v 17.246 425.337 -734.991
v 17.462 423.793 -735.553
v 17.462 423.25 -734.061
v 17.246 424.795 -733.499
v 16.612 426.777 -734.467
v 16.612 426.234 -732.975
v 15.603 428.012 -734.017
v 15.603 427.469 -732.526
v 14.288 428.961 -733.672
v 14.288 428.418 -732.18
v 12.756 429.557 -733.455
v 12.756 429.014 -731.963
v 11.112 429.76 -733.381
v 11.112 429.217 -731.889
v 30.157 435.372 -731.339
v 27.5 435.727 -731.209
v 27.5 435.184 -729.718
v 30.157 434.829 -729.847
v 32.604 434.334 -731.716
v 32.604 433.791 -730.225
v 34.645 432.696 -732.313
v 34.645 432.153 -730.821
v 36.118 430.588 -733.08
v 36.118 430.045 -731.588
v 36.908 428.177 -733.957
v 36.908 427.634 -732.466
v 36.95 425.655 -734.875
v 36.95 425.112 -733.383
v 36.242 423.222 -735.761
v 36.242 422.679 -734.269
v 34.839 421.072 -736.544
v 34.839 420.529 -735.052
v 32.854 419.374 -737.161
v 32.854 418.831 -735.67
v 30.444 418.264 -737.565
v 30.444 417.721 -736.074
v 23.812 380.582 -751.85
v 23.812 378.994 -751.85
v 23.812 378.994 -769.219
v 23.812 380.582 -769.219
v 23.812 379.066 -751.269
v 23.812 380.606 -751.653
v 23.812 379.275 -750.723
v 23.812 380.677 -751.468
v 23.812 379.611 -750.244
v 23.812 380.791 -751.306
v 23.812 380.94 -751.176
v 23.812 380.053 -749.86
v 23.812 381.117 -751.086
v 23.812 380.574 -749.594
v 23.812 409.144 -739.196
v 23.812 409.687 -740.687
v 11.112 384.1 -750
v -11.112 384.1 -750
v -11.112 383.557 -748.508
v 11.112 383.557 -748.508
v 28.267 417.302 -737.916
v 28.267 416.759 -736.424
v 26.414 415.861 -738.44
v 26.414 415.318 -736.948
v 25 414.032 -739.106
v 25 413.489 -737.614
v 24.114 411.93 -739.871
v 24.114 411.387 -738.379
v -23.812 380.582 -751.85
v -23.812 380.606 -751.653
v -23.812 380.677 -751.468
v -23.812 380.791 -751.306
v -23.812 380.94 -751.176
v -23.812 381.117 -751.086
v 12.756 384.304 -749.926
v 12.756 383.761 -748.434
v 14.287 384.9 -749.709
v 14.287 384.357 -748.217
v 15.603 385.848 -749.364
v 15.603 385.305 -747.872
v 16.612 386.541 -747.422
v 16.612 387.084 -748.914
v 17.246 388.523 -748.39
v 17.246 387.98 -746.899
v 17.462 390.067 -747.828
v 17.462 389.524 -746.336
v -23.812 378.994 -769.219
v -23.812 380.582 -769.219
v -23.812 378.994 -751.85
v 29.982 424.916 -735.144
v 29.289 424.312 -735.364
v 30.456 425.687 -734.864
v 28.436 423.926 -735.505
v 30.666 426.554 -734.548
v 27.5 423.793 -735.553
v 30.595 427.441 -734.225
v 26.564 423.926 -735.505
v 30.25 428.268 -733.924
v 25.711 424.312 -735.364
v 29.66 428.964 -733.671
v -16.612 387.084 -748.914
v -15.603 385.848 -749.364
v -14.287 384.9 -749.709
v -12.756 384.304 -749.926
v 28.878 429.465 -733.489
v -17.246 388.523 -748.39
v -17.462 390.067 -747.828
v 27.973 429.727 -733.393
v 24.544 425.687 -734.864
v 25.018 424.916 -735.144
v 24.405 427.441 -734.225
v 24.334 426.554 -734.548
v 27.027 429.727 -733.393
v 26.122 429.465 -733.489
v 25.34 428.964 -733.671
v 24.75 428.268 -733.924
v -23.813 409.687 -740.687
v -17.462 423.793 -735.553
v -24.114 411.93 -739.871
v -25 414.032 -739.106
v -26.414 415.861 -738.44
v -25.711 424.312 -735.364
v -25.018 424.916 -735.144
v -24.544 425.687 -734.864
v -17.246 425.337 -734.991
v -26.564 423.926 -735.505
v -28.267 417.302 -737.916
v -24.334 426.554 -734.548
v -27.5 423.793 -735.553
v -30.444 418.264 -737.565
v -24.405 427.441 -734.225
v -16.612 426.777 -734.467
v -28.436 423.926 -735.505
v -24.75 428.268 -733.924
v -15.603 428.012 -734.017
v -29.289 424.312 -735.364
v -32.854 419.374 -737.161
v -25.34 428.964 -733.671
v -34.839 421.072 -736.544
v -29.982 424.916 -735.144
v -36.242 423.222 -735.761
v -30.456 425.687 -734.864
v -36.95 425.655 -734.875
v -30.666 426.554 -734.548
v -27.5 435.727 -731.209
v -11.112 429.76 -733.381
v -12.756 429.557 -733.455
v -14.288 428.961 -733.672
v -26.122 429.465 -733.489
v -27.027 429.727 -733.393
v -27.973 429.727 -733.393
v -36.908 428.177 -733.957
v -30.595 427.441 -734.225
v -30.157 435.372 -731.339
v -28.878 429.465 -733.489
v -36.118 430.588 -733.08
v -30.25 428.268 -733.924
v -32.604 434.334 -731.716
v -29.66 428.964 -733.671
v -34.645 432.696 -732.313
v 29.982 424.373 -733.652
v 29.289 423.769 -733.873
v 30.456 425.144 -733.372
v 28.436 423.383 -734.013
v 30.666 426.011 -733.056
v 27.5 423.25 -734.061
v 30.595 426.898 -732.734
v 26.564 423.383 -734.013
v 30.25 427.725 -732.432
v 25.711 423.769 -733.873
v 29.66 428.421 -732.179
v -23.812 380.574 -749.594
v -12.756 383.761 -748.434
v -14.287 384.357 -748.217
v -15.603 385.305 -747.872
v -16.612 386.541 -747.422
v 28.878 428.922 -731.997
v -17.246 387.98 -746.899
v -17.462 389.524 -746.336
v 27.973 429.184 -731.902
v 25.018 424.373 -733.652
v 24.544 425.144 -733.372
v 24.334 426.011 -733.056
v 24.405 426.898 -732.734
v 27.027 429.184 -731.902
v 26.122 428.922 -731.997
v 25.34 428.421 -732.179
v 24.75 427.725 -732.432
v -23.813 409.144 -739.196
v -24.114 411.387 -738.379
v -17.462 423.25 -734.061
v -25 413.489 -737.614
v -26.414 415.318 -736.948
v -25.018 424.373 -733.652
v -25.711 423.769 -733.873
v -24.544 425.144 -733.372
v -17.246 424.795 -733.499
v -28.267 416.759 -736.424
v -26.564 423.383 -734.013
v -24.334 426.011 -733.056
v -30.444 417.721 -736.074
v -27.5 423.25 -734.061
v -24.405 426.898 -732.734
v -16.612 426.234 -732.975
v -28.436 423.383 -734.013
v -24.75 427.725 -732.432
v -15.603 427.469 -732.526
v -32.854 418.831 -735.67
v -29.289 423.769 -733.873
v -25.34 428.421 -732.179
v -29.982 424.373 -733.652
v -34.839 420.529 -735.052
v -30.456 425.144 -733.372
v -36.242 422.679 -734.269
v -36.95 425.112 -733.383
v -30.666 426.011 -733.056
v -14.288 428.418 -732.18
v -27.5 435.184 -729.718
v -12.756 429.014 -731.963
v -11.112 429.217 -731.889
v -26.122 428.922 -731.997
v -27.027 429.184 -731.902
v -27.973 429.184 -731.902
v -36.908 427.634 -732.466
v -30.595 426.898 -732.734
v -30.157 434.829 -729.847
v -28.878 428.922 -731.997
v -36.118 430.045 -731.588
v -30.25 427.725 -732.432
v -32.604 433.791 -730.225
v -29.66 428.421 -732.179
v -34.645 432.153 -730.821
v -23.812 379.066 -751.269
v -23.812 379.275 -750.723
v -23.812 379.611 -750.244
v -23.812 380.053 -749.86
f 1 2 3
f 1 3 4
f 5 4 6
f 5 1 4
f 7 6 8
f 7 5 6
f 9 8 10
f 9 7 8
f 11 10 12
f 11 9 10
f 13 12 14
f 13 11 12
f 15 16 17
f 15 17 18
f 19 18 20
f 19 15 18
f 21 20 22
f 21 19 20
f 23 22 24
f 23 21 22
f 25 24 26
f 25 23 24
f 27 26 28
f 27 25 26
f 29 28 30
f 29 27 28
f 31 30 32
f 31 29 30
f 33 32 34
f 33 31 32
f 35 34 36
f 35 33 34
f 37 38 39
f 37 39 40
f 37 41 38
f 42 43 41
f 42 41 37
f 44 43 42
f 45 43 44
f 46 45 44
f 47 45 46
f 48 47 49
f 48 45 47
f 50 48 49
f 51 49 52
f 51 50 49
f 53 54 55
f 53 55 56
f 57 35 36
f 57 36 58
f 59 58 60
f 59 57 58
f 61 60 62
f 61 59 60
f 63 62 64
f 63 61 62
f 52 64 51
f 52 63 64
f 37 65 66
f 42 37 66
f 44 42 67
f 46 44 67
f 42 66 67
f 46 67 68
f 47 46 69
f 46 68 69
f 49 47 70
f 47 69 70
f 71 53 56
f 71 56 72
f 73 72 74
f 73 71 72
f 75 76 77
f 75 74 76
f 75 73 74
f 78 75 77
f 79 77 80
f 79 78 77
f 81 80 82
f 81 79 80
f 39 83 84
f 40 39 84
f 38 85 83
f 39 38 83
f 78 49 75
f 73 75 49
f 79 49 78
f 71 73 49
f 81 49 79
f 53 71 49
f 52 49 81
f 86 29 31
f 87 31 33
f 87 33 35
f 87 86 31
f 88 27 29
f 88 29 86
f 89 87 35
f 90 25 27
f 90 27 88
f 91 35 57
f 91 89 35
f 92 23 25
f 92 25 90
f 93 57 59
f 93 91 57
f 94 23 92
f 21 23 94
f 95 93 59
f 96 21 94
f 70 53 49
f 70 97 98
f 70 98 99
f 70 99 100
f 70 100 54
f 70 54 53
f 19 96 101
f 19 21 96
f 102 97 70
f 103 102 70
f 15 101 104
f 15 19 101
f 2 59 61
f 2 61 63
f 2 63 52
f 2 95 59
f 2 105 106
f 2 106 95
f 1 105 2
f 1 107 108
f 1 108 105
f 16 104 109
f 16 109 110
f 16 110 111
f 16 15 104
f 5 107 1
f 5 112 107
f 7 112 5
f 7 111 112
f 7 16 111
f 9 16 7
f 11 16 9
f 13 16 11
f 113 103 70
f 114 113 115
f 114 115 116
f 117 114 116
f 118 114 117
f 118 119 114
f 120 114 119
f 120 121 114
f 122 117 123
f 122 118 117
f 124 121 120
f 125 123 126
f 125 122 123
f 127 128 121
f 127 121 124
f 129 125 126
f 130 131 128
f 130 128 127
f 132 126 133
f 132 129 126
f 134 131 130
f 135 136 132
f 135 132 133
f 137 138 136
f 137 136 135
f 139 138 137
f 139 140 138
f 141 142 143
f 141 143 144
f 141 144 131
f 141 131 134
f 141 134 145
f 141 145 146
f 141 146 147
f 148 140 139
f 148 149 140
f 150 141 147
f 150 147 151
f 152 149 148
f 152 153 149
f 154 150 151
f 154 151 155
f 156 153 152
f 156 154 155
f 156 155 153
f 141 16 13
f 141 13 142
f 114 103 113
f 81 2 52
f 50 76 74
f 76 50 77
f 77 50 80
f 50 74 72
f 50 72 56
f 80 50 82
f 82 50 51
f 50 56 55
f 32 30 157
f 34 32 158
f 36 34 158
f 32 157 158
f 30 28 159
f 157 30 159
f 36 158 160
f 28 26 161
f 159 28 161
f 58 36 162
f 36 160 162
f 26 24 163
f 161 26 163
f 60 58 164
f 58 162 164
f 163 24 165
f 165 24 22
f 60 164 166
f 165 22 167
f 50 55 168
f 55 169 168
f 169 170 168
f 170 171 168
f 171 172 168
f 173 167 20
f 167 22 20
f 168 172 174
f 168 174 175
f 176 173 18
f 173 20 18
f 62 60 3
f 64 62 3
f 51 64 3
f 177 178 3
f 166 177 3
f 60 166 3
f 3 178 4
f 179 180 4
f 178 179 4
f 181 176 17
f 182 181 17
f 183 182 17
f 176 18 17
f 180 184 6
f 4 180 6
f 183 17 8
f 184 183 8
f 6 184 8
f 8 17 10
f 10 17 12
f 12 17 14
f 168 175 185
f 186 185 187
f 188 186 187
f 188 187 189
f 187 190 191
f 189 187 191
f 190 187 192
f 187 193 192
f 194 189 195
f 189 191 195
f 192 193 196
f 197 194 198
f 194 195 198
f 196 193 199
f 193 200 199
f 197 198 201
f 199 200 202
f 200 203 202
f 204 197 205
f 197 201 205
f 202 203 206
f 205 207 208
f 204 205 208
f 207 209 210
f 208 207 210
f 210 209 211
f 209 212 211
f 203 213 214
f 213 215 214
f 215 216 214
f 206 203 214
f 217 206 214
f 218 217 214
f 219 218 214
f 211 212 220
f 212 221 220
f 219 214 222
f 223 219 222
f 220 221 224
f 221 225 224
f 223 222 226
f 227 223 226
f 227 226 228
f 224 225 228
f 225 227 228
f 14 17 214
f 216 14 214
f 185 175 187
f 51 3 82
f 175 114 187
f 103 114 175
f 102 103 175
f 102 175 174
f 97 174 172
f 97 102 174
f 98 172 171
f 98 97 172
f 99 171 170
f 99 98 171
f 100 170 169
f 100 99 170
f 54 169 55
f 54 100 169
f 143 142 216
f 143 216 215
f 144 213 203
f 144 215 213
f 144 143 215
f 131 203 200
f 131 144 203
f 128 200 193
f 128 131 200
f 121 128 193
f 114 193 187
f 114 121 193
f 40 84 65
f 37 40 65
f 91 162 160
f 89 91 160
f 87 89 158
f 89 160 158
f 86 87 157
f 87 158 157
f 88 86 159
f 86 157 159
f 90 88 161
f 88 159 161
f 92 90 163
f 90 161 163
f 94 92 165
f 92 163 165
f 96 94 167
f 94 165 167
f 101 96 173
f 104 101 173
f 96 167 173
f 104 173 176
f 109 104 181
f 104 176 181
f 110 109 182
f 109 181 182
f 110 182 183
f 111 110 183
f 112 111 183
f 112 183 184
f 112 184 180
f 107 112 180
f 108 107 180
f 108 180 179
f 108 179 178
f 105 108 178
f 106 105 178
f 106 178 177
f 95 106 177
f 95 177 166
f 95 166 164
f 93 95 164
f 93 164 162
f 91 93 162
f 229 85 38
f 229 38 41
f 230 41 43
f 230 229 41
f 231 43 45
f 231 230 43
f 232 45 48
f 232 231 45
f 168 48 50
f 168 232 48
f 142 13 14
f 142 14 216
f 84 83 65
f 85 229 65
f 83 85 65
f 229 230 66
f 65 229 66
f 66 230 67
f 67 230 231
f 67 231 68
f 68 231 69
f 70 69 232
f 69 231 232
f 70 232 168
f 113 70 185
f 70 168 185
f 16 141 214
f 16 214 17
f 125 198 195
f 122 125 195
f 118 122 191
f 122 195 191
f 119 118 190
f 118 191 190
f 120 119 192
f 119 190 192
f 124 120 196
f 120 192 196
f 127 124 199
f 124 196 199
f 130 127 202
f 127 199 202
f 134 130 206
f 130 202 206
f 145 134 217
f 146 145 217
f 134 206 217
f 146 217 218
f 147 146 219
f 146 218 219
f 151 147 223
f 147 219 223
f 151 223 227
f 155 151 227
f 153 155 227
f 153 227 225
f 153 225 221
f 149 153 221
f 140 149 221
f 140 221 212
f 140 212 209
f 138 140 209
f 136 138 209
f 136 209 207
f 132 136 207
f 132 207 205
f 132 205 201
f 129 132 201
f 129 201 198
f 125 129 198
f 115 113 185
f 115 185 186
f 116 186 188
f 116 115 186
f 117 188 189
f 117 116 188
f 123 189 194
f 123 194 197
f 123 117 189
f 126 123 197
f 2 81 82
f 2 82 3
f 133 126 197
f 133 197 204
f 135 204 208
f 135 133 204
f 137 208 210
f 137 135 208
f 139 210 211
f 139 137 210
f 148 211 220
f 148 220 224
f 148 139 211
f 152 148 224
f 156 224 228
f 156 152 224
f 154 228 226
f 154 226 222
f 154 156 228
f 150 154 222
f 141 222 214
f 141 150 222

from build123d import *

# Parameters (mm, degrees)
BASE_FLANGE1_DEPTH   = 1.5875
EDGE_FLANGE1_START   = -23.8125
EDGE_FLANGE1_DEPTH   = 47.625
EDGE_FLANGE1_2_DEPTH = 47.625
SKETCH9_R            = 3.175
CUT_EXTRUDE1_DEPTH   = 2.54
CUT_EXTRUDE2_DEPTH   = 2.54


# Read off the part's stored shape, not the designer's step: Edge-Flange1
# Sheet-metal steps are written as plain solids
with BuildPart() as part:
    # Sketch1 → Base-Flange1 (new body)
    with BuildSketch(Plane(origin=(0, 285.976549587, -785.714112483), x_dir=(1, 0, 0), z_dir=(0, -0.34202014332566955, 0.9396926207859082))):
        with BuildLine():
            Line((-27.5, 159.361299231), (27.5, 159.361299231))
            ThreePointArc((27.5, 159.361299231), (36.907682688, 151.326645312), (30.443979637, 140.777678536))
            ThreePointArc((30.443979637, 140.777678536), (25.645376408, 137.290929389), (23.8125, 131.64960183))
            Line((23.8125, 131.64960183), (23.8125, 98.987567929))
            Line((23.8125, 98.987567929), (-23.8125, 98.987567929))
            Line((-23.8125, 98.987567929), (-23.8125, 131.64960183))
            ThreePointArc((-23.8125, 131.64960183), (-25.645376408, 137.290929389), (-30.443979637, 140.777678536))
            ThreePointArc((-30.443979637, 140.777678536), (-36.907682688, 151.326645312), (-27.5, 159.361299231))
        make_face()
    extrude(amount=BASE_FLANGE1_DEPTH)

    # Edge-Flange1 outline → Edge-Flange1 (cut)
    with BuildSketch(Plane.YZ.offset(EDGE_FLANGE1_START)):
        with BuildLine():
            Line((378.994436719, -751.858370313), (378.994436719, -751.849696253))
            ThreePointArc((378.994436719, -751.849696253), (379.428526068, -750.472940733), (380.573785769, -749.594152055))
            Line((380.573785769, -749.594152055), (378.451479742, -750.366608277))
            Line((378.451479742, -750.366608277), (378.994436719, -751.858370313))
        make_face()
    extrude(amount=EDGE_FLANGE1_DEPTH, mode=Mode.SUBTRACT)

    # Edge-Flange1 2 outline → Edge-Flange1 2 (add)
    with BuildSketch(Plane.YZ.offset(EDGE_FLANGE1_START)):
        with BuildLine():
            Line((381.116742747, -751.085914091), (378.994436719, -751.858370313))
            Line((378.994436719, -751.858370313), (378.994436719, -769.218988099))
            Line((378.994436719, -769.218988099), (380.581936719, -769.218988099))
            Line((380.581936719, -769.218988099), (380.581936719, -751.849696253))
            ThreePointArc((380.581936719, -751.849696253), (380.728929938, -751.383493326), (381.116742747, -751.085914091))
        make_face()
    extrude(amount=EDGE_FLANGE1_2_DEPTH)

    # Sketch9 → Cut-Extrude1 (cut)
    with BuildSketch(Plane(origin=(0, 285.433592609, -784.222350448), x_dir=(1, 0, 0), z_dir=(0, -0.34202014332566955, 0.9396926207859082))):
        with Locations(Location((-27.5, 149.836299231, 0), (0, 0, 270))):
            Circle(SKETCH9_R)
        with Locations(Location((27.5, 149.836299231, 0), (0, 0, 270))):
            Circle(SKETCH9_R)
    extrude(amount=-CUT_EXTRUDE1_DEPTH, mode=Mode.SUBTRACT)

    # Sketch10 → Cut-Extrude2 (cut)
    with BuildSketch(Plane(origin=(0, 285.976549587, -785.714112483), x_dir=(-1, 0, 0), z_dir=(0, 0.34202014332566955, -0.9396926207859082))):
        with BuildLine():
            Line((-11.1125, 153.011299231), (11.1125, 153.011299231))
            ThreePointArc((11.1125, 153.011299231), (15.602628061, 151.151427292), (17.4625, 146.661299231))
            Line((17.4625, 146.661299231), (17.4625, 110.77107883))
            ThreePointArc((17.4625, 110.77107883), (15.602628061, 106.28095077), (11.1125, 104.42107883))
            Line((11.1125, 104.42107883), (-11.1125, 104.42107883))
            ThreePointArc((-11.1125, 104.42107883), (-15.602628061, 106.28095077), (-17.4625, 110.77107883))
            Line((-17.4625, 110.77107883), (-17.4625, 146.661299231))
            ThreePointArc((-17.4625, 146.661299231), (-15.602628061, 151.151427292), (-11.1125, 153.011299231))
        make_face()
    extrude(amount=-CUT_EXTRUDE2_DEPTH, mode=Mode.SUBTRACT)


solid = part.part
